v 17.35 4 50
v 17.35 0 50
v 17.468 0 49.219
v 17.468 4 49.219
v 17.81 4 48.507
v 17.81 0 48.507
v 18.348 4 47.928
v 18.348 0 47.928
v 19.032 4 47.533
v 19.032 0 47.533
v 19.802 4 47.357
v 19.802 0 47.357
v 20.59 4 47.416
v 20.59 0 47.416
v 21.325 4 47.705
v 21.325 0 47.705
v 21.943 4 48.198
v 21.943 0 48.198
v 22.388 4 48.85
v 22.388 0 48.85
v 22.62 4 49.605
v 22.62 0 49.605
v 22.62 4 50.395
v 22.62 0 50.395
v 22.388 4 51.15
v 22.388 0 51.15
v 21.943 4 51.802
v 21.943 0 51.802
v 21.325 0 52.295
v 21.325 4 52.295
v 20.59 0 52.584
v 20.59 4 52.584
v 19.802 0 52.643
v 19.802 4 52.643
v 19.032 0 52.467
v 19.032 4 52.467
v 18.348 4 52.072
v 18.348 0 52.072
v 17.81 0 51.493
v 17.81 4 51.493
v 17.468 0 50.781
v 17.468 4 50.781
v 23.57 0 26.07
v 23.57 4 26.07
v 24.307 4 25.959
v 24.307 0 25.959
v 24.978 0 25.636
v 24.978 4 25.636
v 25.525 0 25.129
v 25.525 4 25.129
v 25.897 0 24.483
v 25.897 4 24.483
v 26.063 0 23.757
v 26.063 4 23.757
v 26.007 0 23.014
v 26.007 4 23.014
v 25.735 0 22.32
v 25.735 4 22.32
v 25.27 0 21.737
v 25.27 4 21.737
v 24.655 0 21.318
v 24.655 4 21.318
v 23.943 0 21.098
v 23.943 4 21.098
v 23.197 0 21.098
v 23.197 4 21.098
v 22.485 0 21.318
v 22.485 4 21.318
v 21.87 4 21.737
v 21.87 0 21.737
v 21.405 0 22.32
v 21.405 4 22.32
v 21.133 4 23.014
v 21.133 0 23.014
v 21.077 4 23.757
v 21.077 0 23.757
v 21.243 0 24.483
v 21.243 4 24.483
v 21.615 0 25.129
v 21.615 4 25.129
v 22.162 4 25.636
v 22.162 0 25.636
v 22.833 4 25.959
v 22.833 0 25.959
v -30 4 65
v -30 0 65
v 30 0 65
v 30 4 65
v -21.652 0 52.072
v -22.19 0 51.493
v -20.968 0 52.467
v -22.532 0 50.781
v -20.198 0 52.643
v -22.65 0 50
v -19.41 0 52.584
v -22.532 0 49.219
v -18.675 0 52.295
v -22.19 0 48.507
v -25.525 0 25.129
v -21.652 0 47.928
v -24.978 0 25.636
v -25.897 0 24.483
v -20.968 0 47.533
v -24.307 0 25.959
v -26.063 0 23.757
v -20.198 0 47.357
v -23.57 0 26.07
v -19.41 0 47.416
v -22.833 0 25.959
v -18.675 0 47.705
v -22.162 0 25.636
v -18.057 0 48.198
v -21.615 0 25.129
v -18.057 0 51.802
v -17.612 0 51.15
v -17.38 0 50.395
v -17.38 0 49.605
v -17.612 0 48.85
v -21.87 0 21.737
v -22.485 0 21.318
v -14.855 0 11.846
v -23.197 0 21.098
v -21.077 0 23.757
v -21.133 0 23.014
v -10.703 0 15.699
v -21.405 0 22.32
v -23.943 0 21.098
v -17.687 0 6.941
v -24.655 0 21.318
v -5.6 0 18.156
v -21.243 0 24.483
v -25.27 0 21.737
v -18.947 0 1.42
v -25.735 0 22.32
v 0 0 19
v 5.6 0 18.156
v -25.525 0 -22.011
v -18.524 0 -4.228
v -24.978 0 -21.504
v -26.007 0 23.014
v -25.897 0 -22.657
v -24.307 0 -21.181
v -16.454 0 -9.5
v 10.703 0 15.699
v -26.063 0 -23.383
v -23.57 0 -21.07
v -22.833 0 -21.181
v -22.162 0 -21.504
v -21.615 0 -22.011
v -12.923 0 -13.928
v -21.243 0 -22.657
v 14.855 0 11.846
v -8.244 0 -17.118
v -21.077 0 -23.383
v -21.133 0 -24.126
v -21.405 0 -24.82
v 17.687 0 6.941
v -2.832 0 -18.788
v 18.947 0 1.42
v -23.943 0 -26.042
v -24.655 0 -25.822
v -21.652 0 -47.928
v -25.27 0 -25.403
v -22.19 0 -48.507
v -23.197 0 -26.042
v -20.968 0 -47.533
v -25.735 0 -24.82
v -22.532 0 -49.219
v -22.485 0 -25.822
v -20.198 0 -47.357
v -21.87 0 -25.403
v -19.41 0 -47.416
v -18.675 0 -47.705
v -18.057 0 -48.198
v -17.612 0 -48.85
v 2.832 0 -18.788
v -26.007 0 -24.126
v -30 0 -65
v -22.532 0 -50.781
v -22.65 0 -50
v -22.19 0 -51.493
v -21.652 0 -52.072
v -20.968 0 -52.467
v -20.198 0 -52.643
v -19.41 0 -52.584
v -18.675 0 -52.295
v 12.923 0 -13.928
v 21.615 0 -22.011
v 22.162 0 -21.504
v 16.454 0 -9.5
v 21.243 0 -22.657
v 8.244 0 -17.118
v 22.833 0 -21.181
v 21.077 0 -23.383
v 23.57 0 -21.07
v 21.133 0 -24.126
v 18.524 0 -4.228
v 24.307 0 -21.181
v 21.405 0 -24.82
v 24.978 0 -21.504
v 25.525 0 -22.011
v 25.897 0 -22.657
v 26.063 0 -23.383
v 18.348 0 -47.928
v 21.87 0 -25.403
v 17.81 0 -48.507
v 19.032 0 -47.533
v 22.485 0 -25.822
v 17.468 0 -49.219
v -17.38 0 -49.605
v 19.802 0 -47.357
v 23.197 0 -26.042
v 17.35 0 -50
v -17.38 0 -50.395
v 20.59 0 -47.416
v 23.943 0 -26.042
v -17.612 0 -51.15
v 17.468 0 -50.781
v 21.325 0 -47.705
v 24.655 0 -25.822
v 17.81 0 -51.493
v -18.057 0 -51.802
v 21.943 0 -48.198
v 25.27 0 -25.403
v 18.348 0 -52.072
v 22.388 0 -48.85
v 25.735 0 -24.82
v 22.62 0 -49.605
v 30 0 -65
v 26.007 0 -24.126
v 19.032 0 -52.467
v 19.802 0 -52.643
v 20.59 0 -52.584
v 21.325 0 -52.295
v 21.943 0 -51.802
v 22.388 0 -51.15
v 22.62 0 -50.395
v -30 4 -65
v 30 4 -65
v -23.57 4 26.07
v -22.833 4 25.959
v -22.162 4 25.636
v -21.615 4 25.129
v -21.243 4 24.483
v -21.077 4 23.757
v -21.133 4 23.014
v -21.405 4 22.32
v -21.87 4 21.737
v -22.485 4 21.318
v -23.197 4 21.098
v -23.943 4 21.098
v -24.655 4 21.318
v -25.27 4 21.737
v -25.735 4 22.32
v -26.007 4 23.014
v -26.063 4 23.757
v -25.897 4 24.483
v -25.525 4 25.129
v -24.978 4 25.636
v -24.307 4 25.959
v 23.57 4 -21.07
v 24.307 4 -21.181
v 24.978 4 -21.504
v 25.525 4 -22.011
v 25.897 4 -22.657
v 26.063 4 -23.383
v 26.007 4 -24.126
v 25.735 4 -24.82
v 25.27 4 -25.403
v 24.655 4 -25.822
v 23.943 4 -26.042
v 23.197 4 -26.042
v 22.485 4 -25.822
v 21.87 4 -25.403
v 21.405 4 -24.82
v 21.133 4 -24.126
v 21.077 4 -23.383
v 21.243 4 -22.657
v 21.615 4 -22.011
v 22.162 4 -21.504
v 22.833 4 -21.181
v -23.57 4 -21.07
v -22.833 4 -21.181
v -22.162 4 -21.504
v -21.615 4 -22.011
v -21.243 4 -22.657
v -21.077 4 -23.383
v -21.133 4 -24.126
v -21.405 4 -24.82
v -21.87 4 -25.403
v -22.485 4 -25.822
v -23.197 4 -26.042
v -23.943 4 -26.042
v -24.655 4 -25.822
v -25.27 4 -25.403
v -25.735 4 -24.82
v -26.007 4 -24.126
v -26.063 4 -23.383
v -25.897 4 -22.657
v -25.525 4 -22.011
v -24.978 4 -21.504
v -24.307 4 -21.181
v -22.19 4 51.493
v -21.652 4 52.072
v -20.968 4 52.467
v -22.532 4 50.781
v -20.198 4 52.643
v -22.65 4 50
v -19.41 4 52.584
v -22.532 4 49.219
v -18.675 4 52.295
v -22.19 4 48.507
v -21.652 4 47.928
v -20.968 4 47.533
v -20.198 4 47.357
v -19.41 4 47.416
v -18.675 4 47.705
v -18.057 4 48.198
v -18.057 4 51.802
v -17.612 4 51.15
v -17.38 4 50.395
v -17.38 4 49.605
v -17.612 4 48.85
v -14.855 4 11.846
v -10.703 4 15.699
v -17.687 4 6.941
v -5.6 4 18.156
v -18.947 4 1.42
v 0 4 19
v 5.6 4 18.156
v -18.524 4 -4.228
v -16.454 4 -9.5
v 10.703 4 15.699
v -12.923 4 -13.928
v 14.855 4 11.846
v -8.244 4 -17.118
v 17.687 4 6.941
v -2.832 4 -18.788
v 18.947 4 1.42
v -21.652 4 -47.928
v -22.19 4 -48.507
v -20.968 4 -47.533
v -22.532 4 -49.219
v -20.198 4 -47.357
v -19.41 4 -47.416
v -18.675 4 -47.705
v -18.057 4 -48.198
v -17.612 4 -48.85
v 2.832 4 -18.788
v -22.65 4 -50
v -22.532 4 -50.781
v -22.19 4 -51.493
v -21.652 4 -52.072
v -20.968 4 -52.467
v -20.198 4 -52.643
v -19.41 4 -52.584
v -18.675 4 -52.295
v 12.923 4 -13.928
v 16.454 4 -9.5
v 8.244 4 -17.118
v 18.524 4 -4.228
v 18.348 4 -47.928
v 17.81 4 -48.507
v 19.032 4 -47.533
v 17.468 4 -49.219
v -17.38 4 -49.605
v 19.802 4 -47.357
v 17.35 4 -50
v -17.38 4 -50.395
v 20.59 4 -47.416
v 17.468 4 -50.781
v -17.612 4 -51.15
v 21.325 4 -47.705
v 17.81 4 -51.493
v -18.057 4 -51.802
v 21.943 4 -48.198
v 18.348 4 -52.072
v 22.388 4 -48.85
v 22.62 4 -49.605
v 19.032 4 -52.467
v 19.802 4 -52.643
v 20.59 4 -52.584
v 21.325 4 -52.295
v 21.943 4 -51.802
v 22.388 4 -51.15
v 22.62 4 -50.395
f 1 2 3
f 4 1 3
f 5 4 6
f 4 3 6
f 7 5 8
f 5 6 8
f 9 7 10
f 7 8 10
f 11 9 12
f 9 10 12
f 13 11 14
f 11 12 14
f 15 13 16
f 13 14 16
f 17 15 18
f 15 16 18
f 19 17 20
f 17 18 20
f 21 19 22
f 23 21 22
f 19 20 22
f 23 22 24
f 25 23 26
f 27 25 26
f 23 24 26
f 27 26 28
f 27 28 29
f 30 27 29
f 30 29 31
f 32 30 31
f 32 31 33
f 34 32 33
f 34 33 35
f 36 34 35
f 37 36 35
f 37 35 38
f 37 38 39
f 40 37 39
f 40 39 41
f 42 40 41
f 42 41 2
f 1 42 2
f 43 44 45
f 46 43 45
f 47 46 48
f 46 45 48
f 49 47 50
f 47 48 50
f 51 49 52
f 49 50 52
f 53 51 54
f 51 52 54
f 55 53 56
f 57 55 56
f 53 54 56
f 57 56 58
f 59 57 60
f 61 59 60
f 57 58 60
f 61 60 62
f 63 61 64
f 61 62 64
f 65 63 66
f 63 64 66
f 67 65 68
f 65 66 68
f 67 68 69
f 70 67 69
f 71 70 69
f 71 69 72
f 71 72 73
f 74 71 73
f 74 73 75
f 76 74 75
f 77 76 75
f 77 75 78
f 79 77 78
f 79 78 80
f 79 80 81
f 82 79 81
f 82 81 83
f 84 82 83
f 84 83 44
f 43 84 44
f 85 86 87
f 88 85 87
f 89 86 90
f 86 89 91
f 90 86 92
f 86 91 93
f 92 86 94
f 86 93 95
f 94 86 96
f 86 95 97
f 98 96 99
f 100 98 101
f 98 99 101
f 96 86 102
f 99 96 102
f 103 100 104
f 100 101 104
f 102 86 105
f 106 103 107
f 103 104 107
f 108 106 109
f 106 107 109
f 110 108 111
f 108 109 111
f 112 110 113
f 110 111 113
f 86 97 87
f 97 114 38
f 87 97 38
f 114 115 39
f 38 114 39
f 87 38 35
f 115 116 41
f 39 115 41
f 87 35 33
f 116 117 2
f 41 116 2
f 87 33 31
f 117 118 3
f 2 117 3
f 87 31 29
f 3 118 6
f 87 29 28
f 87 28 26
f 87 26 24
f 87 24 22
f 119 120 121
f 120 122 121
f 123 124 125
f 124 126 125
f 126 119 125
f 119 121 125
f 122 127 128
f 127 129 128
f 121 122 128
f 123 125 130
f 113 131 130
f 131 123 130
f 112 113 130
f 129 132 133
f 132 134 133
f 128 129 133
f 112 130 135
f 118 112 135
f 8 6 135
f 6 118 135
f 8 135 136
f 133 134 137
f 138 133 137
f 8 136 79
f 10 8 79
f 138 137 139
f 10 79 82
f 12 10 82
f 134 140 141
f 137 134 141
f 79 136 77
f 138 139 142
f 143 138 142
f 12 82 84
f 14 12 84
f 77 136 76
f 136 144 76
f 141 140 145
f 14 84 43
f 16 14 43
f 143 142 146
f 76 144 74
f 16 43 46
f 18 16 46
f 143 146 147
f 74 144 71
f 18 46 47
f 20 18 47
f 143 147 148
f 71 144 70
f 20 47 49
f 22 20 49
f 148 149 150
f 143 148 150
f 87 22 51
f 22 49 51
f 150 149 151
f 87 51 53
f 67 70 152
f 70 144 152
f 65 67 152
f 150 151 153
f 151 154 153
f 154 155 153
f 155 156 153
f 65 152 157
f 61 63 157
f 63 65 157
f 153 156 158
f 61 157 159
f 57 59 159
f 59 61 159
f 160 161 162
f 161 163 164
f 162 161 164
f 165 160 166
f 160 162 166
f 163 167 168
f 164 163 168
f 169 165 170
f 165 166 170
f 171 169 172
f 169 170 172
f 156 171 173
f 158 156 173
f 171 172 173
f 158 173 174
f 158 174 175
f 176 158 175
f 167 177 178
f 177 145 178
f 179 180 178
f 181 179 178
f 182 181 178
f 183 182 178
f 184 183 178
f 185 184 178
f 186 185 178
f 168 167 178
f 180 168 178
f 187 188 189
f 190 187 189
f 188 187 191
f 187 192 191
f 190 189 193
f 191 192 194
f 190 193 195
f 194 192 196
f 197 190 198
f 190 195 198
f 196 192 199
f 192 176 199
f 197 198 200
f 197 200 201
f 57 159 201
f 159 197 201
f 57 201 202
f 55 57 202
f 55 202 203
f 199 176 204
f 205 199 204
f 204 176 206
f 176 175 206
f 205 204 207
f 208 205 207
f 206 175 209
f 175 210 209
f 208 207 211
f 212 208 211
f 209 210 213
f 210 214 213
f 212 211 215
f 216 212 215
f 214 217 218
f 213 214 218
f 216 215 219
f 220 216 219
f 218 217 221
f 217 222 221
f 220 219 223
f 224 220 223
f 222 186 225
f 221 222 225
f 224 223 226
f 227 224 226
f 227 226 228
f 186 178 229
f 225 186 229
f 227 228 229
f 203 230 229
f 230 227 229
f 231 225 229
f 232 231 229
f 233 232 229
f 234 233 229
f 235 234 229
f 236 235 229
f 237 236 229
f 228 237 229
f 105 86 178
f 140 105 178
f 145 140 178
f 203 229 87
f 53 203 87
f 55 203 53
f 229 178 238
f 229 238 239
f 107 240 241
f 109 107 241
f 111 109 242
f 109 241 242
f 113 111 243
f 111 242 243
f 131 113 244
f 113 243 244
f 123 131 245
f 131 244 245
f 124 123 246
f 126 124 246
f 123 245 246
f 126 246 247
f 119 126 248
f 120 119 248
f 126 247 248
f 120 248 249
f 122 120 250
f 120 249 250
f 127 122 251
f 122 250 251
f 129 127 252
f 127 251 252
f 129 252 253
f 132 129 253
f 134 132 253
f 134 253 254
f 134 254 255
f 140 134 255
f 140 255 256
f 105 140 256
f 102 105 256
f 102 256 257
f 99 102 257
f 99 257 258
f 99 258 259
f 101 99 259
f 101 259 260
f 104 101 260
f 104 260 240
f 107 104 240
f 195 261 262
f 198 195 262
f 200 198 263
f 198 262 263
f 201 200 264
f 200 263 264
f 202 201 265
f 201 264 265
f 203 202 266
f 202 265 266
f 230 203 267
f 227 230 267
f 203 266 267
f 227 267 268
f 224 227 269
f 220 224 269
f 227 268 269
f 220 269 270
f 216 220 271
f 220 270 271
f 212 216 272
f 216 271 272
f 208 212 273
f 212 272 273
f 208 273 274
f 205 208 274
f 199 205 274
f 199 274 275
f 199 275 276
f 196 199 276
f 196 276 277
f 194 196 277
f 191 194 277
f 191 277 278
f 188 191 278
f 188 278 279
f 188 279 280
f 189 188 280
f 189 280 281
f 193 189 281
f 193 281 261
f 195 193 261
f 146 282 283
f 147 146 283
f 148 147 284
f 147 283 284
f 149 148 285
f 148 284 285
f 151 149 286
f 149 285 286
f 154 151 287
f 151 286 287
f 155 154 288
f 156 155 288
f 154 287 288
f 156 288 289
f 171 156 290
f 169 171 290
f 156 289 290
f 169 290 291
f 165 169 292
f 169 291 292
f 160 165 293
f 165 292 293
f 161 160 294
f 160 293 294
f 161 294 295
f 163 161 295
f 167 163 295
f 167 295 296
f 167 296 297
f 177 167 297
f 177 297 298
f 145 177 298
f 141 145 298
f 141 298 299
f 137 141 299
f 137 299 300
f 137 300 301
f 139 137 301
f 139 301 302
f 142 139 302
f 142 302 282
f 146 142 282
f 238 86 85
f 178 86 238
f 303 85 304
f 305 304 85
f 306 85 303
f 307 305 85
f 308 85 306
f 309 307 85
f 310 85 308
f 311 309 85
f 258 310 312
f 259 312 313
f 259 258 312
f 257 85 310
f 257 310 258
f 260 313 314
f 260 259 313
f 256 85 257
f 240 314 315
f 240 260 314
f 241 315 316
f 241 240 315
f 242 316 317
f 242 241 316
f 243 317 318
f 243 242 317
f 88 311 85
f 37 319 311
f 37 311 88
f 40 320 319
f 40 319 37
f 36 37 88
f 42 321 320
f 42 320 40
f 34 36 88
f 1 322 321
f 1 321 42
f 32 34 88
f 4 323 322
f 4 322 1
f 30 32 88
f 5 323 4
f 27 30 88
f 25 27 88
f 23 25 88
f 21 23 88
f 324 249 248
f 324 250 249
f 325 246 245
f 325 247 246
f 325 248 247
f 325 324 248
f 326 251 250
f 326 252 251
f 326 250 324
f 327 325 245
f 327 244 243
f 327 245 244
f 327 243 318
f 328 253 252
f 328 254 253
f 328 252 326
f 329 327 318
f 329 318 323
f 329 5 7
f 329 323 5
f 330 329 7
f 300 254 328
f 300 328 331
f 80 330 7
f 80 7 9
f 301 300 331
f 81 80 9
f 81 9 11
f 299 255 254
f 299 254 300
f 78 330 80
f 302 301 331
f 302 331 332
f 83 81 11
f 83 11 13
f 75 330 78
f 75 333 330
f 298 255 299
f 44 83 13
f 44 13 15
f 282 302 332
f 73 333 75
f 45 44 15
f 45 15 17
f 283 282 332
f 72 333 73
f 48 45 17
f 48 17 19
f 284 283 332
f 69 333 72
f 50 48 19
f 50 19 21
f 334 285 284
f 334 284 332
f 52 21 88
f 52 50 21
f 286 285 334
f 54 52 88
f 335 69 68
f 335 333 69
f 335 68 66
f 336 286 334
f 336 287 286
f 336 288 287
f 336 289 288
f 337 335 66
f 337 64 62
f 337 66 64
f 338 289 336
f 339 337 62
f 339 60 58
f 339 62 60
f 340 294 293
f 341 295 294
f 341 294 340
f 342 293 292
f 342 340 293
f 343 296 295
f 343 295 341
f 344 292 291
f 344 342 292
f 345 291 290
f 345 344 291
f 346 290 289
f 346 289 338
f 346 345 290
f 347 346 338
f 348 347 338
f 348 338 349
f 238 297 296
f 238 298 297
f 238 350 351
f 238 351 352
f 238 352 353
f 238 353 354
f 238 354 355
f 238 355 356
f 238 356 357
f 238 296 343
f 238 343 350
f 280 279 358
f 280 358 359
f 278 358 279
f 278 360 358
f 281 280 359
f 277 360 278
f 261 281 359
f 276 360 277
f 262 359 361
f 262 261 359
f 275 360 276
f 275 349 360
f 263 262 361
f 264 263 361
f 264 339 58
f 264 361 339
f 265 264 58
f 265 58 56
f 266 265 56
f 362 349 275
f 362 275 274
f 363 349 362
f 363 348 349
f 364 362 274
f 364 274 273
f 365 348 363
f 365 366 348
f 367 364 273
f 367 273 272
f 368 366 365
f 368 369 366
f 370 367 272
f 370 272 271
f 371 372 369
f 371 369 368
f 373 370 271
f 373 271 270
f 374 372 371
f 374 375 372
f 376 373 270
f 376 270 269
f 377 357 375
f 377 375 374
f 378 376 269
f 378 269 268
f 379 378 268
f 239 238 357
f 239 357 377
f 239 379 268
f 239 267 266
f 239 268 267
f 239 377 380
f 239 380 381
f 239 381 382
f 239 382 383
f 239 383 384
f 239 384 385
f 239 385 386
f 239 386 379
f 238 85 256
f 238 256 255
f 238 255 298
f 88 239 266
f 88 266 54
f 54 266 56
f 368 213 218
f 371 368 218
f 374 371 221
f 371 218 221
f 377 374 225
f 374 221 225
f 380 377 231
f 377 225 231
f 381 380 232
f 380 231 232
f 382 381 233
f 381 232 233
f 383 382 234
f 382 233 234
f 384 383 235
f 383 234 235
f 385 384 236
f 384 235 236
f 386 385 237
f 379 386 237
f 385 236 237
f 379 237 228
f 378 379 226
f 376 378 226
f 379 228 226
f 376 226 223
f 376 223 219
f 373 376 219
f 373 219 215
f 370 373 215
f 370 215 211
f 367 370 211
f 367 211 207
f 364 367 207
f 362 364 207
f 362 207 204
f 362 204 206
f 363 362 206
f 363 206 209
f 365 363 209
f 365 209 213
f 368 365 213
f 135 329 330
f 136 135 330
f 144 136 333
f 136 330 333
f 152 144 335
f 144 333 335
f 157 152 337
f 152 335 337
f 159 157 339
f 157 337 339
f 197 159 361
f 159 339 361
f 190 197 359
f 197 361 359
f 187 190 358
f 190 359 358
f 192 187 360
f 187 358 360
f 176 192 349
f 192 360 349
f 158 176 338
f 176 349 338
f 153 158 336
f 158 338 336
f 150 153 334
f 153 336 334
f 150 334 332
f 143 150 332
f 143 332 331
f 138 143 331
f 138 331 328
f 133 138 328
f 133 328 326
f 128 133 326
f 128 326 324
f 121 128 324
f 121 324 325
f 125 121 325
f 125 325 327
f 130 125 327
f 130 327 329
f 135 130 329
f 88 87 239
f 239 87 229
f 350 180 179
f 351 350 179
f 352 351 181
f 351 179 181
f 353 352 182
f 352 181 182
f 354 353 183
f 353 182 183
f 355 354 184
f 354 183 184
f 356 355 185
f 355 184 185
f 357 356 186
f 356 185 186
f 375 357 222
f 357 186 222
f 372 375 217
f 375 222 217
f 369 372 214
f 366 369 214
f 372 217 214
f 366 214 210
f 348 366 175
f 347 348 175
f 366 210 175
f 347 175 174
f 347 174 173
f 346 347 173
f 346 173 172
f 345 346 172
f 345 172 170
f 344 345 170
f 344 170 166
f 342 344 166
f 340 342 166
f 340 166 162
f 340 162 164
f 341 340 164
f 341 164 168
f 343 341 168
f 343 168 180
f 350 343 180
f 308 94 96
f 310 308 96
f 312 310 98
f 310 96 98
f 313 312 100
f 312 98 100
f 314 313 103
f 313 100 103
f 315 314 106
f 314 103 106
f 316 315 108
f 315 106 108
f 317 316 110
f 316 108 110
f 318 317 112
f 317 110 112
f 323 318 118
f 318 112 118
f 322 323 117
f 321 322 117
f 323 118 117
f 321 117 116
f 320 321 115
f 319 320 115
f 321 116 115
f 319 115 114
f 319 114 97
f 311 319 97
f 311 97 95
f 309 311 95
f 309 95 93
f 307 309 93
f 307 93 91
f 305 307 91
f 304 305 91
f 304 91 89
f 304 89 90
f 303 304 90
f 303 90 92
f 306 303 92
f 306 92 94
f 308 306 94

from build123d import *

# Parameters (mm, degrees)
ESBO_O1_W                = 60
ESBO_O1_H                = 130
RESSALTO_EXTRUS_O1_DEPTH = 4
ESBO_O2_R                = 19
ESBO_O2_R_2              = 2.5
CORTE_EXTRUS_O1_DEPTH    = 72.700767081
FURO_COM_FOLGA_DE_M51_D  = 5.3


with BuildPart() as part:
    # Esboço1 → Ressalto-extrusão1 (new body)
    with BuildSketch(Plane(origin=(0, 0, 0), x_dir=(1, 0, 0), z_dir=(0, 1, 0))):
        Rectangle(ESBO_O1_W, ESBO_O1_H)
    extrude(amount=RESSALTO_EXTRUS_O1_DEPTH)

    # Esboço2 → Corte-extrusão1 (cut, through all)
    with BuildSketch(Plane(origin=(0, 4, 0), x_dir=(1, 0, 0), z_dir=(0, 1, 0))):
        with Locations(Location((0, 0, 0), (0, 0, 270))):
            Circle(ESBO_O2_R)
        with Locations(Location((-23.57, 23.57, 0), (0, 0, 270))):
            Circle(ESBO_O2_R_2)
        with Locations(Location((23.57, 23.57, 0), (0, 0, 270))):
            Circle(ESBO_O2_R_2)
        with Locations(Location((23.57, -23.57, 0), (0, 0, 270))):
            Circle(ESBO_O2_R_2)
        with Locations(Location((-23.57, -23.57, 0), (0, 0, 270))):
            Circle(ESBO_O2_R_2)
    extrude(amount=-CORTE_EXTRUS_O1_DEPTH, mode=Mode.SUBTRACT)

    # Furo com folga de M51 (through all)
    with Locations(Plane(origin=(0, 4, 0), x_dir=(1, 0, 0), z_dir=(0, 1, 0))):
        with Locations((-20, -50), (20, -50), (-20, 50), (20, 50)):
            Hole(FURO_COM_FOLGA_DE_M51_D / 2)


solid = part.part
